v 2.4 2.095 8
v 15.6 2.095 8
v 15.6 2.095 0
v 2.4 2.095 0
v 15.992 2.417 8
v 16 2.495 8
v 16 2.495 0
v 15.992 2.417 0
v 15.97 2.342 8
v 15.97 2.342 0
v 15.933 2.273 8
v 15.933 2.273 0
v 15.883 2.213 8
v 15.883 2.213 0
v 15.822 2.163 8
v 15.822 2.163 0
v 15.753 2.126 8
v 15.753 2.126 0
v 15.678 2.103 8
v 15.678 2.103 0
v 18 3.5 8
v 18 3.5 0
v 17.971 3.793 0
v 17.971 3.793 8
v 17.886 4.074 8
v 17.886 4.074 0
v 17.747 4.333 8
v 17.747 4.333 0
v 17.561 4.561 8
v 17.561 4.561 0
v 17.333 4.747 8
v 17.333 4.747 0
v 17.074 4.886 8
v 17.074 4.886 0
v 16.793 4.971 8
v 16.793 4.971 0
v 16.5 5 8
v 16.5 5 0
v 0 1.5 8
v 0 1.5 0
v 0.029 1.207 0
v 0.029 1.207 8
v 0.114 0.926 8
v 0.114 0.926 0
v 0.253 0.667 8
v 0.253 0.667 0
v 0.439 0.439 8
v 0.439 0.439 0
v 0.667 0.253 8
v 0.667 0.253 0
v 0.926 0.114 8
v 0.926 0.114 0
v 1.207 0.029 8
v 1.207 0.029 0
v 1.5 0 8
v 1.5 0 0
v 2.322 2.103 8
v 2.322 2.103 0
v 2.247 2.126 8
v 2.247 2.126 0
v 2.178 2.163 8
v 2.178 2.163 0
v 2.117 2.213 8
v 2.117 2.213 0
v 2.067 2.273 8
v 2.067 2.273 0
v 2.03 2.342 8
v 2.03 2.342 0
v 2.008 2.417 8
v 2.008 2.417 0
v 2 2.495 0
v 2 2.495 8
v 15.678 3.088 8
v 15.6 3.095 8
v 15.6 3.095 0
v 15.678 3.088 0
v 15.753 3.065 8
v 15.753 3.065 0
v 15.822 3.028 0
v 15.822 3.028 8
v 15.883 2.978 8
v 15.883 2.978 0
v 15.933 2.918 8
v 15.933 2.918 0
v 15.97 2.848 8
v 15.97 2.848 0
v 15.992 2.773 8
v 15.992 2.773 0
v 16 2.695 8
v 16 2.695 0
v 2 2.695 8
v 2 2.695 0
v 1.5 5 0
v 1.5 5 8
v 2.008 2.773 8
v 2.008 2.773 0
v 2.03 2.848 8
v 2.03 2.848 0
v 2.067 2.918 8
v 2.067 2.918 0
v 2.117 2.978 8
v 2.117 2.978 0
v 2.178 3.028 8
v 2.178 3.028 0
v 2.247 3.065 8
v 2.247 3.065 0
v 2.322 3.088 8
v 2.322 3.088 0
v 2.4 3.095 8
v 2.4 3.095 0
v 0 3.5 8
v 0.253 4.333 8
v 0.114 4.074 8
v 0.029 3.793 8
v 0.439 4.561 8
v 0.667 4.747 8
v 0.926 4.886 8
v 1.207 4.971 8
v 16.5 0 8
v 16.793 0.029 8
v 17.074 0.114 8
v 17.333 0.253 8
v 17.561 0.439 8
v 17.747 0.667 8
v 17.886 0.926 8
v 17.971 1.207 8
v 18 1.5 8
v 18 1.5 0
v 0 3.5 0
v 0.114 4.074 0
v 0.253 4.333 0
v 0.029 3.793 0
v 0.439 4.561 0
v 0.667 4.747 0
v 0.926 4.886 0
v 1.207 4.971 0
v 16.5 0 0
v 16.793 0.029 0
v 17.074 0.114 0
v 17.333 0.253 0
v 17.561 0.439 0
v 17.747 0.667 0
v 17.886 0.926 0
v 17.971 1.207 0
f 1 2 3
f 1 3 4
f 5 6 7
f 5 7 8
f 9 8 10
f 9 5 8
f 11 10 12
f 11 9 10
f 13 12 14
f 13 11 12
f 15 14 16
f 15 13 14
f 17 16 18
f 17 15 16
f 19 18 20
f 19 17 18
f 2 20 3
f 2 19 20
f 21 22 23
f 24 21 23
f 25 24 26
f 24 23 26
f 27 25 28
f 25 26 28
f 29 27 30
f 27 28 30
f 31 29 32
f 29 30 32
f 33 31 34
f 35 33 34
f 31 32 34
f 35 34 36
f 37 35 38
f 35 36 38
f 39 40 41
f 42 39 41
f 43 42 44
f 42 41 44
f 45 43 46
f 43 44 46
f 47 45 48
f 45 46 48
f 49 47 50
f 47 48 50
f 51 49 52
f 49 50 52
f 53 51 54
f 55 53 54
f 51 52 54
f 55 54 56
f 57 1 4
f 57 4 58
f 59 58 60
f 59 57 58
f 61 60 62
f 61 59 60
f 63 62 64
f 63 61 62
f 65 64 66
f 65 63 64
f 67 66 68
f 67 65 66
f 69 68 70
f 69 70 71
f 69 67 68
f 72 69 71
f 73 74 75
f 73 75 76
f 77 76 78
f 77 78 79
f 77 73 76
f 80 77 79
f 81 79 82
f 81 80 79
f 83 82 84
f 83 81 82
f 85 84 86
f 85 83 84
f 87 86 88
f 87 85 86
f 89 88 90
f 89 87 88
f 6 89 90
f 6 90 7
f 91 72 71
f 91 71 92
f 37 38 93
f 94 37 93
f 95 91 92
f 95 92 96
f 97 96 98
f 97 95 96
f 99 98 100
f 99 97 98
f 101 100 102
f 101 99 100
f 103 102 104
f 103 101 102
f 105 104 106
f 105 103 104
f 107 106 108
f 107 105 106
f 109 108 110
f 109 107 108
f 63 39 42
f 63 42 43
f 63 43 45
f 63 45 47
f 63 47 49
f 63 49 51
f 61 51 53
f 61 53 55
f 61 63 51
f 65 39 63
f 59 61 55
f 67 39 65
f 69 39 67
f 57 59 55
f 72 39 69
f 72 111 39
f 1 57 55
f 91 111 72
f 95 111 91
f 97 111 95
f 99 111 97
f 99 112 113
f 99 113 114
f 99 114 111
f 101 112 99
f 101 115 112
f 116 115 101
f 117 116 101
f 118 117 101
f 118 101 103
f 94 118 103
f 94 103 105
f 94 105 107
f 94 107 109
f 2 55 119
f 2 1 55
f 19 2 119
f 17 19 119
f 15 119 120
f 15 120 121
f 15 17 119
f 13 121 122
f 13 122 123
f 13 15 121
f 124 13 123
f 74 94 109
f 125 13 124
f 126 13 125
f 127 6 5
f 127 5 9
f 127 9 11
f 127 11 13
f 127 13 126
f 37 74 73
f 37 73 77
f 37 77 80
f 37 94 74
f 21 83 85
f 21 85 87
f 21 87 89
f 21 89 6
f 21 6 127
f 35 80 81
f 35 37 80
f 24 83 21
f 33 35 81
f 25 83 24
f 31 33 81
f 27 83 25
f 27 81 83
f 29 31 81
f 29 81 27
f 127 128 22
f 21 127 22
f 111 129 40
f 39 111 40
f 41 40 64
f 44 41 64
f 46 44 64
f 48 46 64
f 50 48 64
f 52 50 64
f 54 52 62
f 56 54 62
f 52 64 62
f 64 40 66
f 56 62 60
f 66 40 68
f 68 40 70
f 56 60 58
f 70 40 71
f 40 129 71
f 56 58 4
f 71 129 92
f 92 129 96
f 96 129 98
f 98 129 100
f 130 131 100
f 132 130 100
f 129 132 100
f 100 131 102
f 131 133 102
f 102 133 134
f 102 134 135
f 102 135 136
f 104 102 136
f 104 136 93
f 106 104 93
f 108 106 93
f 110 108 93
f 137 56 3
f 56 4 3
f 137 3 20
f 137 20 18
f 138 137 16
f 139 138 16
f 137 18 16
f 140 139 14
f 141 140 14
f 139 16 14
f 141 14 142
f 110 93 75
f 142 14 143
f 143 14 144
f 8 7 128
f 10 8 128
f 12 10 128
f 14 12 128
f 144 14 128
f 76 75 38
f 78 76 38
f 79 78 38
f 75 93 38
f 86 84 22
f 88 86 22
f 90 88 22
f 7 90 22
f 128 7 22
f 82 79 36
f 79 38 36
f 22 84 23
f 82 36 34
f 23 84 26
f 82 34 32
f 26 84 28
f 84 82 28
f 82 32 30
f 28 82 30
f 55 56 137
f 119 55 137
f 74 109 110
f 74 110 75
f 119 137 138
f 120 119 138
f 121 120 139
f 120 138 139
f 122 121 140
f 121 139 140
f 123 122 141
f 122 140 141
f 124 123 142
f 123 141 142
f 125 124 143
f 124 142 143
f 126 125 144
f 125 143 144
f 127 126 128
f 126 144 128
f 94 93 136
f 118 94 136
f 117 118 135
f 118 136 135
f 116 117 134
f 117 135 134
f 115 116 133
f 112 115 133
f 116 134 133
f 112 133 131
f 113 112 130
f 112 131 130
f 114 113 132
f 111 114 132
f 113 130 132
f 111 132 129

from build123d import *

# Parameters (mm, degrees)
EXTRUSION1_DEPTH        = 8
ENL_V_MAT_EXTRU_1_DEPTH = 8


with BuildPart() as part:
    # Esquisse1 → Extrusion1 (new body)
    with BuildSketch(Plane.XY):
        with BuildLine():
            Line((1.5, 0), (16.5, 0))
            ThreePointArc((16.5, 0), (17.560660172, 0.439339828), (18, 1.5))
            Line((18, 1.5), (18, 3.5))
            ThreePointArc((18, 3.5), (17.560660172, 4.560660172), (16.5, 5))
            Line((16.5, 5), (1.5, 5))
            ThreePointArc((1.5, 5), (0.439339828, 4.560660172), (0, 3.5))
            Line((0, 3.5), (0, 1.5))
            ThreePointArc((0, 1.5), (0.439339828, 0.439339828), (1.5, 0))
        make_face()
    extrude(amount=EXTRUSION1_DEPTH)

    # Esquisse2 → Enlèv. mat.-Extru.1 (cut)
    with BuildSketch(Plane.XY.offset(8)):
        with BuildLine():
            Line((2.4, 3.095375723), (15.6, 3.095375723))
            ThreePointArc((15.6, 3.095375723), (15.882842712, 2.978218435), (16, 2.695375723))
            Line((16, 2.695375723), (16, 2.495375723))
            ThreePointArc((16, 2.495375723), (15.882842712, 2.21253301), (15.6, 2.095375723))
            Line((15.6, 2.095375723), (2.4, 2.095375723))
            ThreePointArc((2.4, 2.095375723), (2.117157288, 2.21253301), (2, 2.495375723))
            Line((2, 2.495375723), (2, 2.695375723))
            ThreePointArc((2, 2.695375723), (2.117157288, 2.978218435), (2.4, 3.095375723))
        make_face()
    extrude(amount=-ENL_V_MAT_EXTRU_1_DEPTH, mode=Mode.SUBTRACT)


solid = part.part
